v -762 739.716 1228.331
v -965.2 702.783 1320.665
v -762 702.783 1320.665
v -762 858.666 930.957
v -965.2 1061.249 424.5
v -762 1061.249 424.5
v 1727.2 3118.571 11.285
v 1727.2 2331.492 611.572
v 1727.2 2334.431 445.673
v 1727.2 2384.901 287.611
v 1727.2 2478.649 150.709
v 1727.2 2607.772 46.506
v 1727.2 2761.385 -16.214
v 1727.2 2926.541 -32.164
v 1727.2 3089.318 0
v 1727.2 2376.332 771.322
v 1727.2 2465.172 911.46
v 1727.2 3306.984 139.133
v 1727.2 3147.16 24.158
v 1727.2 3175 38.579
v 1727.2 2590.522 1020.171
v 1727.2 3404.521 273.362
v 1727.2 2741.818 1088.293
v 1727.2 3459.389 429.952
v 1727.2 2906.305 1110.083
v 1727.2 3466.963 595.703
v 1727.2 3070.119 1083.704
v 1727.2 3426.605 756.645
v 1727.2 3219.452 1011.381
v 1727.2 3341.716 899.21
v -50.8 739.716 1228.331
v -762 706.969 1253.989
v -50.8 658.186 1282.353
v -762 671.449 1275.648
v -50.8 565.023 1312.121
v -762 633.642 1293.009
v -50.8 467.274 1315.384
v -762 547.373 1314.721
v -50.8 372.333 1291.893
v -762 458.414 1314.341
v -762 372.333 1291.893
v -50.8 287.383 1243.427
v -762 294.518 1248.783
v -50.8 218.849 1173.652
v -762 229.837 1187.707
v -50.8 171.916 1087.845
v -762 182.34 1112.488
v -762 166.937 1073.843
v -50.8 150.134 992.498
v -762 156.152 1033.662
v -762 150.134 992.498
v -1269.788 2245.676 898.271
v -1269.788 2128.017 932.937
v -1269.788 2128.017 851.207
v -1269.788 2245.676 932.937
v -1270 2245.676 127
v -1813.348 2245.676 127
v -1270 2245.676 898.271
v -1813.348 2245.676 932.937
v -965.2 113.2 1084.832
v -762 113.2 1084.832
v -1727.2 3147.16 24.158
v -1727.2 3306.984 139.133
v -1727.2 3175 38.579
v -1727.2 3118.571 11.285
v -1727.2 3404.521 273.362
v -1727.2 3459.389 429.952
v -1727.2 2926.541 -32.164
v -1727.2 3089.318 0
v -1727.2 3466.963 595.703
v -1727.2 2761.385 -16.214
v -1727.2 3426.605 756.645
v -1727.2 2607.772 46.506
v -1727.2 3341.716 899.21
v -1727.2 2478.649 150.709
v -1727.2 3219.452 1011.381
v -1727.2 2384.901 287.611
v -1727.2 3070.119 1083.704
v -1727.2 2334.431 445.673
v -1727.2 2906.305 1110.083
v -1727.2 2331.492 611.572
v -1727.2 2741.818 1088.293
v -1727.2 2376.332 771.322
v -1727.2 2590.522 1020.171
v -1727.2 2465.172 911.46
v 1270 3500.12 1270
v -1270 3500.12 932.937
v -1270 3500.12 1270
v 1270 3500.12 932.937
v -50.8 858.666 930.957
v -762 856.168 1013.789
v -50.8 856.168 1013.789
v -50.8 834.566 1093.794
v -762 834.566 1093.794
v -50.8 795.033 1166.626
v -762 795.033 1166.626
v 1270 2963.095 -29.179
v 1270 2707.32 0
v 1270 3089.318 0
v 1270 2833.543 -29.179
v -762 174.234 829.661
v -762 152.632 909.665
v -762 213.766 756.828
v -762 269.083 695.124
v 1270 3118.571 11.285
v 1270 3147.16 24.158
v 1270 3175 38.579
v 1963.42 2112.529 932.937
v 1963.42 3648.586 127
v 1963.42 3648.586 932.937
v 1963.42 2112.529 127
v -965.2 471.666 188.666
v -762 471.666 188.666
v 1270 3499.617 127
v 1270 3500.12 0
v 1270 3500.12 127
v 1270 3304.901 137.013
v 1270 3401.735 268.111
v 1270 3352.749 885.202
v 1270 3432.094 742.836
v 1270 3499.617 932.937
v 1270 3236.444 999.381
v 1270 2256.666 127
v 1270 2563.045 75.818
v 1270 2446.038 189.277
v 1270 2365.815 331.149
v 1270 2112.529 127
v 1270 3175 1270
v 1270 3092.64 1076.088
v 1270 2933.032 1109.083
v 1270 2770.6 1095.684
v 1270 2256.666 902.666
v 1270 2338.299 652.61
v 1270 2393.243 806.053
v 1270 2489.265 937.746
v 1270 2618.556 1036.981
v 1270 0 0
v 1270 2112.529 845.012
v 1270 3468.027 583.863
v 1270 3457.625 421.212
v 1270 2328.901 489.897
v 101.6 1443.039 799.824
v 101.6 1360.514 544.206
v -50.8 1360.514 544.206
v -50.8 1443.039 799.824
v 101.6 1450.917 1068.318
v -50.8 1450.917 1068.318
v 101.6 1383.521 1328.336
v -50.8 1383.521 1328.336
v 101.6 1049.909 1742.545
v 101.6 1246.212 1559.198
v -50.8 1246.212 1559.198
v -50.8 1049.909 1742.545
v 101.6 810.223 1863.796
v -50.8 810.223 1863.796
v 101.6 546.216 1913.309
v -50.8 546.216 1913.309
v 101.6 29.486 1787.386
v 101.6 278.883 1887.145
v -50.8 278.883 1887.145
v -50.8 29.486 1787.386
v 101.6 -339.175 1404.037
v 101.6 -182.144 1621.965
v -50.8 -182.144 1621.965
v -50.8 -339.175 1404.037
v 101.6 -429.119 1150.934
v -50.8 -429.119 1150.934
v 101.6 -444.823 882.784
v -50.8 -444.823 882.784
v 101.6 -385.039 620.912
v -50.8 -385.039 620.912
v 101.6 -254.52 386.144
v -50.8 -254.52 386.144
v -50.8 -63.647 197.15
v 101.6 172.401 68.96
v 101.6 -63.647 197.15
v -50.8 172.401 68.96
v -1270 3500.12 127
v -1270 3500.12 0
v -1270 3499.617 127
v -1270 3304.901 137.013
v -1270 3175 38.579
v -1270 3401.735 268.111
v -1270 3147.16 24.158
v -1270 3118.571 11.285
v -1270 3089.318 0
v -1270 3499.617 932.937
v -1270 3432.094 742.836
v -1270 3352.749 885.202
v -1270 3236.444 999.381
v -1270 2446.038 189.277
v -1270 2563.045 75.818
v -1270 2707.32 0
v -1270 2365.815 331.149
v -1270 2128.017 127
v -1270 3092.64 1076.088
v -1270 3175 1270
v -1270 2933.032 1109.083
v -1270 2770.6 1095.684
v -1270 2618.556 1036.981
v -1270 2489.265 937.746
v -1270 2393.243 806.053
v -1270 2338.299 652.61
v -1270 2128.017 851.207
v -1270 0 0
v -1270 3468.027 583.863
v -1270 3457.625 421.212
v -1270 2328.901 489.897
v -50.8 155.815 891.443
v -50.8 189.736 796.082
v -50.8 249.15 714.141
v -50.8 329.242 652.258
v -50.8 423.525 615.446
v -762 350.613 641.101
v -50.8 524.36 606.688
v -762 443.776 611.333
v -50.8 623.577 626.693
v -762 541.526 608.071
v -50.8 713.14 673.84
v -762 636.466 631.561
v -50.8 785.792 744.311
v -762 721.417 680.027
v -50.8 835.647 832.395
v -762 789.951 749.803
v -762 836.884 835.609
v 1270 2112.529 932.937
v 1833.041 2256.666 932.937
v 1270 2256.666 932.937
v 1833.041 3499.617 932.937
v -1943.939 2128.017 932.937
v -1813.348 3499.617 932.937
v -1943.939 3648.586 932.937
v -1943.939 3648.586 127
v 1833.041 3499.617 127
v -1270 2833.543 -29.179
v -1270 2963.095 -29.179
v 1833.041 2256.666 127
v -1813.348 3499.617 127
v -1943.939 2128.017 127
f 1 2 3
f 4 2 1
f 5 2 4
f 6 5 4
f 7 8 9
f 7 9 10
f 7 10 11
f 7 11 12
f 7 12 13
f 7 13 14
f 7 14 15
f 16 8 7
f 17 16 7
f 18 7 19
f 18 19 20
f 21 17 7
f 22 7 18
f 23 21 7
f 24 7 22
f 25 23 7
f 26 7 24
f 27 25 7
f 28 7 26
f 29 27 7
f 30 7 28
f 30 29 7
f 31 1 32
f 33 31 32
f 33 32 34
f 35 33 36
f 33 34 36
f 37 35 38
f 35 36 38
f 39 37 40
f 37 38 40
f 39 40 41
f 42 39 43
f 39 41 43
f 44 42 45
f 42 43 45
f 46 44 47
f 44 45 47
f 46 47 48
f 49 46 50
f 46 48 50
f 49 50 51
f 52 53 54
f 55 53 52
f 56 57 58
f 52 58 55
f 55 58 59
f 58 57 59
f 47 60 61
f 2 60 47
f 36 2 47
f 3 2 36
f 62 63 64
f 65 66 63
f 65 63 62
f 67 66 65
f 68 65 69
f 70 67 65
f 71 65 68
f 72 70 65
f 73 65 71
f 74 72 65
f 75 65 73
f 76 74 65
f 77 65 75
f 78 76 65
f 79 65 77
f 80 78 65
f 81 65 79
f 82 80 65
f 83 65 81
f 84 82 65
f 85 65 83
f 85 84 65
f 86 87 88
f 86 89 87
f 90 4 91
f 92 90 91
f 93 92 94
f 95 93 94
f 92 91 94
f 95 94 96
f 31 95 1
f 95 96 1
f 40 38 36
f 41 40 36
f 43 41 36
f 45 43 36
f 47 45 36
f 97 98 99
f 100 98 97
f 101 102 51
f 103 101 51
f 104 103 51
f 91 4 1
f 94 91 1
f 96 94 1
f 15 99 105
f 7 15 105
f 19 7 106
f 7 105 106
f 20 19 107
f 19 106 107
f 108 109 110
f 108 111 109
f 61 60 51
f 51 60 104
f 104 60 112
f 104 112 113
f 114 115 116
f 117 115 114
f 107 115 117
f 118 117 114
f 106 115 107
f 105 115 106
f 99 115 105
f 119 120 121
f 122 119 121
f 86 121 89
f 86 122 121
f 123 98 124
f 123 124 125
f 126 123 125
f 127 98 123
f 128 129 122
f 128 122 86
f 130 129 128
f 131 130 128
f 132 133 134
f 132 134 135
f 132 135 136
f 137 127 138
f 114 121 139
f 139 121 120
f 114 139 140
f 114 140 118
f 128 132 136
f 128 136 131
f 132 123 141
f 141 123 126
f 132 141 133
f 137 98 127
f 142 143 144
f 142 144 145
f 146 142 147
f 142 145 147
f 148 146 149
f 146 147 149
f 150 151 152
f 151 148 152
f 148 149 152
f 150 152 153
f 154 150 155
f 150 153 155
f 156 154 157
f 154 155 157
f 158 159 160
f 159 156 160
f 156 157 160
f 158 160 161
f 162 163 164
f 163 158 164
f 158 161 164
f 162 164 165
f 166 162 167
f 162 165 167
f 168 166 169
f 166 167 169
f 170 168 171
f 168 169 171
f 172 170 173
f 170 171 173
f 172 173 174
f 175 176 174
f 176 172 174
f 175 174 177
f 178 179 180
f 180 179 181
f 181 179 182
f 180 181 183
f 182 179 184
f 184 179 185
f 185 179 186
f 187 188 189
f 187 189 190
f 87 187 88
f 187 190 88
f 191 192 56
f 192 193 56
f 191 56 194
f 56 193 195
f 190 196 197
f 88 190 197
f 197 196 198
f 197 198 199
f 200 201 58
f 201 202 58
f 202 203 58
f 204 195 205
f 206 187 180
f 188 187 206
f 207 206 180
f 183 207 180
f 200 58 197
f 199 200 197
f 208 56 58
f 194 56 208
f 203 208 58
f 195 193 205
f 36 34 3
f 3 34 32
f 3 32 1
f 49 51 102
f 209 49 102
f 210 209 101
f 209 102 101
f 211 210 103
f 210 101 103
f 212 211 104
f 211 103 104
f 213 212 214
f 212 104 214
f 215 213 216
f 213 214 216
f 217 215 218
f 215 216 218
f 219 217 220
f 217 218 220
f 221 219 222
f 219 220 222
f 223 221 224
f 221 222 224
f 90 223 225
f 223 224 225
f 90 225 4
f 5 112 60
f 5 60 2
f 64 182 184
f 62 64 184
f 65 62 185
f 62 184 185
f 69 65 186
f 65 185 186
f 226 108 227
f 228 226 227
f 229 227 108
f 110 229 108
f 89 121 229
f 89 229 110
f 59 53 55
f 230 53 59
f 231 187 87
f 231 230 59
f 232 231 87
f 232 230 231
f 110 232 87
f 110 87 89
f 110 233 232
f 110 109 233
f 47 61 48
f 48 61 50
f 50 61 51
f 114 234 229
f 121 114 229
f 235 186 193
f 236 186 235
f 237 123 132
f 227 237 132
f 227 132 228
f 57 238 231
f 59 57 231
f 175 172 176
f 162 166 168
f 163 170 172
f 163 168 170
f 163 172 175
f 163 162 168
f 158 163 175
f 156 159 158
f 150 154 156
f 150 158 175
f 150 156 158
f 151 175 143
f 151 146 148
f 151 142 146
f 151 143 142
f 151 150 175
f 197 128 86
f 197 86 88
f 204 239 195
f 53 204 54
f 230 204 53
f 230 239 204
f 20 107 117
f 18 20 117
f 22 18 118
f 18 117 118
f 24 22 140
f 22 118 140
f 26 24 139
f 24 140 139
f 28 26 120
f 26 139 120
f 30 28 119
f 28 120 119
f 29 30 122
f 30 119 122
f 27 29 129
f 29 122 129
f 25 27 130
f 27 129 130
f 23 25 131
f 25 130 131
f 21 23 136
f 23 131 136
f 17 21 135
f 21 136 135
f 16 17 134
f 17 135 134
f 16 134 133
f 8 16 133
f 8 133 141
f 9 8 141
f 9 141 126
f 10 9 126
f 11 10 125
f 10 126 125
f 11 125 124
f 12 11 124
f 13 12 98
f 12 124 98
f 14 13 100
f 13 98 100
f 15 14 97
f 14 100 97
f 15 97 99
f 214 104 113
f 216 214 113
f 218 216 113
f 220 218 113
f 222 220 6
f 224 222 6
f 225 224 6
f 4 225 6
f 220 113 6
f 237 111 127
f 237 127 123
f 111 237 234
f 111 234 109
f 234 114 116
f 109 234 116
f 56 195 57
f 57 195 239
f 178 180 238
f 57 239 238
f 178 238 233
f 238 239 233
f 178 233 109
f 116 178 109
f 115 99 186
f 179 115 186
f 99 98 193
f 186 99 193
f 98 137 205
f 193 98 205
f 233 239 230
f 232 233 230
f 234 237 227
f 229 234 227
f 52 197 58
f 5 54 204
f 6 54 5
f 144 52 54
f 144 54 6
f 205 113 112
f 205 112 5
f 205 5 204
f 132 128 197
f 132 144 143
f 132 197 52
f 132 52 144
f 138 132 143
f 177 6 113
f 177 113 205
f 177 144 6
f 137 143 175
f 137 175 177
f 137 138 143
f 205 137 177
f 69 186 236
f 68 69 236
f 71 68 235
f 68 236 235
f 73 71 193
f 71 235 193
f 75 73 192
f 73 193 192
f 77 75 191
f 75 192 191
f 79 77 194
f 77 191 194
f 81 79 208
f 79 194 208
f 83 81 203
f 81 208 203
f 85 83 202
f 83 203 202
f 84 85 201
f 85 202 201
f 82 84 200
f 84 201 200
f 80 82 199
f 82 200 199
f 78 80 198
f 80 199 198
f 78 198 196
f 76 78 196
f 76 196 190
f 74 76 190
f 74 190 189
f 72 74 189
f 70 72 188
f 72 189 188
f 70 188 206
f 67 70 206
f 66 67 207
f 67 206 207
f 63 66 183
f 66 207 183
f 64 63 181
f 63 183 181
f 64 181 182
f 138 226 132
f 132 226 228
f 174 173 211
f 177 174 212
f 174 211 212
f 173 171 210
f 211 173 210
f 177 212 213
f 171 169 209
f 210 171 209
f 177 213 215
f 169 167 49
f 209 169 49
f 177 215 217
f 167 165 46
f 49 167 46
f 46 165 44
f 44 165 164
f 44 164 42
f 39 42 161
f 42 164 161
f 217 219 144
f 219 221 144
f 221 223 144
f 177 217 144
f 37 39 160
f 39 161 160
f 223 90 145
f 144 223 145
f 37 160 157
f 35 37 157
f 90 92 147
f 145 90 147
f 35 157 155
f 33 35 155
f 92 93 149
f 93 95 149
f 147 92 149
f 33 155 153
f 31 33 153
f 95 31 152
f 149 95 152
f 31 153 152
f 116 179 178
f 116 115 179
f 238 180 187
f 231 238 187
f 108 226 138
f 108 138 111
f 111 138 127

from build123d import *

# Parameters (mm, degrees)
F1_DEPTH  = 1270
F3_DEPTH  = 457.2
F5_DEPTH  = 457.2
F7_DEPTH  = 693.42
F8_W      = 130.3792857361
F8_H      = 805.9367705113
F9_DEPTH  = 1391.92
F10_W     = 148.9687260818
F10_H     = 805.9367705113
F11_DEPTH = 3776.98
F12_W     = 130.5909924316
F12_H     = 805.9367705113
F13_DEPTH = 1371.6
F14_W     = 117.6594177246
F14_H     = 805.9367705113
F15_DEPTH = 543.56
F16_W     = 203.2
F16_H     = 635
F17_DEPTH = 965.2
F19_DEPTH = 711.2
F20_R     = 952.5
F21_DEPTH = 152.4
F22_DEPTH = 325.12


with BuildPart() as f1:
    # F0 (on Right) → F1 (new body, symmetric)
    with BuildSketch(Plane.YZ):
        Polygon((3175, 1270), (0, 0), (3175, 0), align=None)
    extrude(amount=F1_DEPTH, both=True)

    # F2 (on face) → F3 (join)
    with BuildSketch(Plane.YZ.offset(1270)):
        with BuildLine():
            ThreePointArc((3175, 38.5786582061), (3390.6275667745, 248.389447831), (3469.8190059662, 538.6385321617))
            ThreePointArc((3469.8190059662, 538.6385321617), (3390.6275667745, 828.8876164925), (3175, 1038.6984061173))
            Line((3175, 1038.6984061173), (3175, 38.5786582061))
        make_face()
        with BuildLine():
            Line((3175, 38.5786582061), (3175, 1038.6984061173))
            ThreePointArc((3175, 1038.6984061173), (2377.2058441792, 773.2729768036), (2707.3195775098, 0))
            Line((2707.3195775098, 0), (3089.3184344226, 0))
            ThreePointArc((3089.3184344226, 0), (3132.9534506081, 17.5253703748), (3175, 38.5786582061))
        make_face()
        with BuildLine():
            Line((3089.3184344226, 0), (2707.3195775098, 0))
            ThreePointArc((2707.3195775098, 0), (2898.3190059662, -32.8614678383), (3089.3184344226, 0))
        make_face()
    extrude(amount=F3_DEPTH)

    # F4 (on face) → F5 (join)
    with BuildSketch(Plane(origin=(-1270, 0, 0), x_dir=(0, -1, 0), z_dir=(-1, 0, 0))):
        with BuildLine():
            Line((-3175, 38.5786582061), (-3175, 1038.6984061173))
            ThreePointArc((-3175, 1038.6984061173), (-3469.8190059662, 538.6385321617), (-3175, 38.5786582061))
        make_face()
        with BuildLine():
            ThreePointArc((-3089.3184344226, 0), (-2898.3190059662, -32.8614678383), (-2707.3195775098, 0))
            Line((-2707.3195775098, 0), (-3089.3184344226, 0))
        make_face()
        with BuildLine():
            ThreePointArc((-2707.3195775098, 0), (-2431.538316904, 208.8991831016), (-2326.8190059662, 538.6385321617))
            ThreePointArc((-2326.8190059662, 538.6385321617), (-2608.0699216354, 1030.94709297), (-3175, 1038.6984061173))
            Line((-3175, 1038.6984061173), (-3175, 38.5786582061))
            ThreePointArc((-3175, 38.5786582061), (-3132.9534506081, 17.5253703748), (-3089.3184344226, 0))
            Line((-3089.3184344226, 0), (-2707.3195775098, 0))
        make_face()
    extrude(amount=F5_DEPTH)

    # F6 (on face) → F7 (join)
    with BuildSketch(Plane.YZ.offset(1270)):
        Polygon((2112.5289201736, 127), (2256.6655874252, 127), (2256.6655874252, 902.6662349701), (2112.5289201736, 845.0115680695), align=None)
        Polygon((2112.5289201736, 845.0115680695), (2256.6655874252, 902.6662349701), (2256.6655874252, 932.9367705113), (2112.5289201736, 932.9367705113), align=None)
    extrude(amount=F7_DEPTH)

    # F8 (on face) → F9 (join)
    with BuildSketch(Plane(origin=(0, 2256.6655874252, 0), x_dir=(-1, 0, 0), z_dir=(0, 1, 0))):
        with Locations((-1898.230357132, 529.9683852557)):
            Rectangle(F8_W, F8_H)
    extrude(amount=F9_DEPTH)

    # F10 (on face) → F11 (join)
    with BuildSketch(Plane(origin=(1833.0407142639, 0, 0), x_dir=(0, -1, 0), z_dir=(-1, 0, 0))):
        with Locations((-3574.1012243843, 529.9683852557)):
            Rectangle(F10_W, F10_H)
    extrude(amount=F11_DEPTH)

    # F12 (on face) → F13 (join)
    with BuildSketch(Plane.XZ.offset(-3499.6168613434)):
        with Locations((-1878.6437895203, 529.9683852557)):
            Rectangle(F12_W, F12_H)
    extrude(amount=F13_DEPTH)

    # F14 (on face) → F15 (join)
    with BuildSketch(Plane.YZ.offset(-1813.3482933044)):
        with Locations((2186.8465702057, 529.9683852557)):
            Rectangle(F14_W, F14_H)
    extrude(amount=F15_DEPTH)

    # F16 (on face) → F17 (join)
    with BuildSketch(Plane(origin=(0, 0, 0), x_dir=(1, 0, 0), z_dir=(0, -0.3713906764, 0.9284766909))):
        with Locations((-863.6, 825.5)):
            Rectangle(F16_W, F16_H)
    extrude(amount=F17_DEPTH)

    # F18 (on face) → F19 (join)
    with BuildSketch(Plane.YZ.offset(-762)):
        with BuildLine():
            ThreePointArc((858.6660271031, 930.9566195196), (859.6662288573, 946.3274518263), (859.9998380943, 961.7271789091))
            ThreePointArc((859.9998380943, 961.7271789091), (828.5370859157, 1107.9680917029), (739.7163477975, 1228.3308177835))
            Line((739.7163477975, 1228.3308177835), (858.6660271031, 930.9566195196))
        make_face()
        with BuildLine():
            Line((858.6660271031, 930.9566195196), (739.7163477975, 1228.3308177835))
            ThreePointArc((739.7163477975, 1228.3308177835), (689.5258400202, 1265.3383173921), (633.6423229739, 1293.0091435588))
            Line((633.6423229739, 1293.0091435588), (182.3401320437, 1112.4882671867))
            ThreePointArc((182.3401320437, 1112.4882671867), (160.9560860217, 1053.9104157926), (150.1336490854, 992.4977382986))
            Line((150.1336490854, 992.4977382986), (269.083328391, 695.1235400347))
            ThreePointArc((269.083328391, 695.1235400347), (636.4663626058, 631.5608676303), (858.6660271031, 930.9566195196))
        make_face()
        with BuildLine():
            Line((182.3401320437, 1112.4882671867), (633.6423229739, 1293.0091435588))
            ThreePointArc((633.6423229739, 1293.0091435588), (372.3333135827, 1291.8934901879), (182.3401320437, 1112.4882671867))
        make_face()
        with BuildLine():
            ThreePointArc((150.1336490854, 992.4977382986), (174.2335268155, 829.6606543976), (269.083328391, 695.1235400347))
            Line((269.083328391, 695.1235400347), (150.1336490854, 992.4977382986))
        make_face()
    extrude(amount=F19_DEPTH)

    # F20 (on face) → F21 (join)
    with BuildSketch(Plane.YZ.offset(-50.8)):
        with Locations((504.3998380943, 961.7271789091)):
            Circle(F20_R)
    extrude(amount=F21_DEPTH)

    # F22 (add): a face of the model
    f22_faces = [f1.faces().sort_by_distance(p)[0] for p in [
        (0, 3175, 635),
    ]]
    extrude(f22_faces, amount=F22_DEPTH)


solid = f1.part
